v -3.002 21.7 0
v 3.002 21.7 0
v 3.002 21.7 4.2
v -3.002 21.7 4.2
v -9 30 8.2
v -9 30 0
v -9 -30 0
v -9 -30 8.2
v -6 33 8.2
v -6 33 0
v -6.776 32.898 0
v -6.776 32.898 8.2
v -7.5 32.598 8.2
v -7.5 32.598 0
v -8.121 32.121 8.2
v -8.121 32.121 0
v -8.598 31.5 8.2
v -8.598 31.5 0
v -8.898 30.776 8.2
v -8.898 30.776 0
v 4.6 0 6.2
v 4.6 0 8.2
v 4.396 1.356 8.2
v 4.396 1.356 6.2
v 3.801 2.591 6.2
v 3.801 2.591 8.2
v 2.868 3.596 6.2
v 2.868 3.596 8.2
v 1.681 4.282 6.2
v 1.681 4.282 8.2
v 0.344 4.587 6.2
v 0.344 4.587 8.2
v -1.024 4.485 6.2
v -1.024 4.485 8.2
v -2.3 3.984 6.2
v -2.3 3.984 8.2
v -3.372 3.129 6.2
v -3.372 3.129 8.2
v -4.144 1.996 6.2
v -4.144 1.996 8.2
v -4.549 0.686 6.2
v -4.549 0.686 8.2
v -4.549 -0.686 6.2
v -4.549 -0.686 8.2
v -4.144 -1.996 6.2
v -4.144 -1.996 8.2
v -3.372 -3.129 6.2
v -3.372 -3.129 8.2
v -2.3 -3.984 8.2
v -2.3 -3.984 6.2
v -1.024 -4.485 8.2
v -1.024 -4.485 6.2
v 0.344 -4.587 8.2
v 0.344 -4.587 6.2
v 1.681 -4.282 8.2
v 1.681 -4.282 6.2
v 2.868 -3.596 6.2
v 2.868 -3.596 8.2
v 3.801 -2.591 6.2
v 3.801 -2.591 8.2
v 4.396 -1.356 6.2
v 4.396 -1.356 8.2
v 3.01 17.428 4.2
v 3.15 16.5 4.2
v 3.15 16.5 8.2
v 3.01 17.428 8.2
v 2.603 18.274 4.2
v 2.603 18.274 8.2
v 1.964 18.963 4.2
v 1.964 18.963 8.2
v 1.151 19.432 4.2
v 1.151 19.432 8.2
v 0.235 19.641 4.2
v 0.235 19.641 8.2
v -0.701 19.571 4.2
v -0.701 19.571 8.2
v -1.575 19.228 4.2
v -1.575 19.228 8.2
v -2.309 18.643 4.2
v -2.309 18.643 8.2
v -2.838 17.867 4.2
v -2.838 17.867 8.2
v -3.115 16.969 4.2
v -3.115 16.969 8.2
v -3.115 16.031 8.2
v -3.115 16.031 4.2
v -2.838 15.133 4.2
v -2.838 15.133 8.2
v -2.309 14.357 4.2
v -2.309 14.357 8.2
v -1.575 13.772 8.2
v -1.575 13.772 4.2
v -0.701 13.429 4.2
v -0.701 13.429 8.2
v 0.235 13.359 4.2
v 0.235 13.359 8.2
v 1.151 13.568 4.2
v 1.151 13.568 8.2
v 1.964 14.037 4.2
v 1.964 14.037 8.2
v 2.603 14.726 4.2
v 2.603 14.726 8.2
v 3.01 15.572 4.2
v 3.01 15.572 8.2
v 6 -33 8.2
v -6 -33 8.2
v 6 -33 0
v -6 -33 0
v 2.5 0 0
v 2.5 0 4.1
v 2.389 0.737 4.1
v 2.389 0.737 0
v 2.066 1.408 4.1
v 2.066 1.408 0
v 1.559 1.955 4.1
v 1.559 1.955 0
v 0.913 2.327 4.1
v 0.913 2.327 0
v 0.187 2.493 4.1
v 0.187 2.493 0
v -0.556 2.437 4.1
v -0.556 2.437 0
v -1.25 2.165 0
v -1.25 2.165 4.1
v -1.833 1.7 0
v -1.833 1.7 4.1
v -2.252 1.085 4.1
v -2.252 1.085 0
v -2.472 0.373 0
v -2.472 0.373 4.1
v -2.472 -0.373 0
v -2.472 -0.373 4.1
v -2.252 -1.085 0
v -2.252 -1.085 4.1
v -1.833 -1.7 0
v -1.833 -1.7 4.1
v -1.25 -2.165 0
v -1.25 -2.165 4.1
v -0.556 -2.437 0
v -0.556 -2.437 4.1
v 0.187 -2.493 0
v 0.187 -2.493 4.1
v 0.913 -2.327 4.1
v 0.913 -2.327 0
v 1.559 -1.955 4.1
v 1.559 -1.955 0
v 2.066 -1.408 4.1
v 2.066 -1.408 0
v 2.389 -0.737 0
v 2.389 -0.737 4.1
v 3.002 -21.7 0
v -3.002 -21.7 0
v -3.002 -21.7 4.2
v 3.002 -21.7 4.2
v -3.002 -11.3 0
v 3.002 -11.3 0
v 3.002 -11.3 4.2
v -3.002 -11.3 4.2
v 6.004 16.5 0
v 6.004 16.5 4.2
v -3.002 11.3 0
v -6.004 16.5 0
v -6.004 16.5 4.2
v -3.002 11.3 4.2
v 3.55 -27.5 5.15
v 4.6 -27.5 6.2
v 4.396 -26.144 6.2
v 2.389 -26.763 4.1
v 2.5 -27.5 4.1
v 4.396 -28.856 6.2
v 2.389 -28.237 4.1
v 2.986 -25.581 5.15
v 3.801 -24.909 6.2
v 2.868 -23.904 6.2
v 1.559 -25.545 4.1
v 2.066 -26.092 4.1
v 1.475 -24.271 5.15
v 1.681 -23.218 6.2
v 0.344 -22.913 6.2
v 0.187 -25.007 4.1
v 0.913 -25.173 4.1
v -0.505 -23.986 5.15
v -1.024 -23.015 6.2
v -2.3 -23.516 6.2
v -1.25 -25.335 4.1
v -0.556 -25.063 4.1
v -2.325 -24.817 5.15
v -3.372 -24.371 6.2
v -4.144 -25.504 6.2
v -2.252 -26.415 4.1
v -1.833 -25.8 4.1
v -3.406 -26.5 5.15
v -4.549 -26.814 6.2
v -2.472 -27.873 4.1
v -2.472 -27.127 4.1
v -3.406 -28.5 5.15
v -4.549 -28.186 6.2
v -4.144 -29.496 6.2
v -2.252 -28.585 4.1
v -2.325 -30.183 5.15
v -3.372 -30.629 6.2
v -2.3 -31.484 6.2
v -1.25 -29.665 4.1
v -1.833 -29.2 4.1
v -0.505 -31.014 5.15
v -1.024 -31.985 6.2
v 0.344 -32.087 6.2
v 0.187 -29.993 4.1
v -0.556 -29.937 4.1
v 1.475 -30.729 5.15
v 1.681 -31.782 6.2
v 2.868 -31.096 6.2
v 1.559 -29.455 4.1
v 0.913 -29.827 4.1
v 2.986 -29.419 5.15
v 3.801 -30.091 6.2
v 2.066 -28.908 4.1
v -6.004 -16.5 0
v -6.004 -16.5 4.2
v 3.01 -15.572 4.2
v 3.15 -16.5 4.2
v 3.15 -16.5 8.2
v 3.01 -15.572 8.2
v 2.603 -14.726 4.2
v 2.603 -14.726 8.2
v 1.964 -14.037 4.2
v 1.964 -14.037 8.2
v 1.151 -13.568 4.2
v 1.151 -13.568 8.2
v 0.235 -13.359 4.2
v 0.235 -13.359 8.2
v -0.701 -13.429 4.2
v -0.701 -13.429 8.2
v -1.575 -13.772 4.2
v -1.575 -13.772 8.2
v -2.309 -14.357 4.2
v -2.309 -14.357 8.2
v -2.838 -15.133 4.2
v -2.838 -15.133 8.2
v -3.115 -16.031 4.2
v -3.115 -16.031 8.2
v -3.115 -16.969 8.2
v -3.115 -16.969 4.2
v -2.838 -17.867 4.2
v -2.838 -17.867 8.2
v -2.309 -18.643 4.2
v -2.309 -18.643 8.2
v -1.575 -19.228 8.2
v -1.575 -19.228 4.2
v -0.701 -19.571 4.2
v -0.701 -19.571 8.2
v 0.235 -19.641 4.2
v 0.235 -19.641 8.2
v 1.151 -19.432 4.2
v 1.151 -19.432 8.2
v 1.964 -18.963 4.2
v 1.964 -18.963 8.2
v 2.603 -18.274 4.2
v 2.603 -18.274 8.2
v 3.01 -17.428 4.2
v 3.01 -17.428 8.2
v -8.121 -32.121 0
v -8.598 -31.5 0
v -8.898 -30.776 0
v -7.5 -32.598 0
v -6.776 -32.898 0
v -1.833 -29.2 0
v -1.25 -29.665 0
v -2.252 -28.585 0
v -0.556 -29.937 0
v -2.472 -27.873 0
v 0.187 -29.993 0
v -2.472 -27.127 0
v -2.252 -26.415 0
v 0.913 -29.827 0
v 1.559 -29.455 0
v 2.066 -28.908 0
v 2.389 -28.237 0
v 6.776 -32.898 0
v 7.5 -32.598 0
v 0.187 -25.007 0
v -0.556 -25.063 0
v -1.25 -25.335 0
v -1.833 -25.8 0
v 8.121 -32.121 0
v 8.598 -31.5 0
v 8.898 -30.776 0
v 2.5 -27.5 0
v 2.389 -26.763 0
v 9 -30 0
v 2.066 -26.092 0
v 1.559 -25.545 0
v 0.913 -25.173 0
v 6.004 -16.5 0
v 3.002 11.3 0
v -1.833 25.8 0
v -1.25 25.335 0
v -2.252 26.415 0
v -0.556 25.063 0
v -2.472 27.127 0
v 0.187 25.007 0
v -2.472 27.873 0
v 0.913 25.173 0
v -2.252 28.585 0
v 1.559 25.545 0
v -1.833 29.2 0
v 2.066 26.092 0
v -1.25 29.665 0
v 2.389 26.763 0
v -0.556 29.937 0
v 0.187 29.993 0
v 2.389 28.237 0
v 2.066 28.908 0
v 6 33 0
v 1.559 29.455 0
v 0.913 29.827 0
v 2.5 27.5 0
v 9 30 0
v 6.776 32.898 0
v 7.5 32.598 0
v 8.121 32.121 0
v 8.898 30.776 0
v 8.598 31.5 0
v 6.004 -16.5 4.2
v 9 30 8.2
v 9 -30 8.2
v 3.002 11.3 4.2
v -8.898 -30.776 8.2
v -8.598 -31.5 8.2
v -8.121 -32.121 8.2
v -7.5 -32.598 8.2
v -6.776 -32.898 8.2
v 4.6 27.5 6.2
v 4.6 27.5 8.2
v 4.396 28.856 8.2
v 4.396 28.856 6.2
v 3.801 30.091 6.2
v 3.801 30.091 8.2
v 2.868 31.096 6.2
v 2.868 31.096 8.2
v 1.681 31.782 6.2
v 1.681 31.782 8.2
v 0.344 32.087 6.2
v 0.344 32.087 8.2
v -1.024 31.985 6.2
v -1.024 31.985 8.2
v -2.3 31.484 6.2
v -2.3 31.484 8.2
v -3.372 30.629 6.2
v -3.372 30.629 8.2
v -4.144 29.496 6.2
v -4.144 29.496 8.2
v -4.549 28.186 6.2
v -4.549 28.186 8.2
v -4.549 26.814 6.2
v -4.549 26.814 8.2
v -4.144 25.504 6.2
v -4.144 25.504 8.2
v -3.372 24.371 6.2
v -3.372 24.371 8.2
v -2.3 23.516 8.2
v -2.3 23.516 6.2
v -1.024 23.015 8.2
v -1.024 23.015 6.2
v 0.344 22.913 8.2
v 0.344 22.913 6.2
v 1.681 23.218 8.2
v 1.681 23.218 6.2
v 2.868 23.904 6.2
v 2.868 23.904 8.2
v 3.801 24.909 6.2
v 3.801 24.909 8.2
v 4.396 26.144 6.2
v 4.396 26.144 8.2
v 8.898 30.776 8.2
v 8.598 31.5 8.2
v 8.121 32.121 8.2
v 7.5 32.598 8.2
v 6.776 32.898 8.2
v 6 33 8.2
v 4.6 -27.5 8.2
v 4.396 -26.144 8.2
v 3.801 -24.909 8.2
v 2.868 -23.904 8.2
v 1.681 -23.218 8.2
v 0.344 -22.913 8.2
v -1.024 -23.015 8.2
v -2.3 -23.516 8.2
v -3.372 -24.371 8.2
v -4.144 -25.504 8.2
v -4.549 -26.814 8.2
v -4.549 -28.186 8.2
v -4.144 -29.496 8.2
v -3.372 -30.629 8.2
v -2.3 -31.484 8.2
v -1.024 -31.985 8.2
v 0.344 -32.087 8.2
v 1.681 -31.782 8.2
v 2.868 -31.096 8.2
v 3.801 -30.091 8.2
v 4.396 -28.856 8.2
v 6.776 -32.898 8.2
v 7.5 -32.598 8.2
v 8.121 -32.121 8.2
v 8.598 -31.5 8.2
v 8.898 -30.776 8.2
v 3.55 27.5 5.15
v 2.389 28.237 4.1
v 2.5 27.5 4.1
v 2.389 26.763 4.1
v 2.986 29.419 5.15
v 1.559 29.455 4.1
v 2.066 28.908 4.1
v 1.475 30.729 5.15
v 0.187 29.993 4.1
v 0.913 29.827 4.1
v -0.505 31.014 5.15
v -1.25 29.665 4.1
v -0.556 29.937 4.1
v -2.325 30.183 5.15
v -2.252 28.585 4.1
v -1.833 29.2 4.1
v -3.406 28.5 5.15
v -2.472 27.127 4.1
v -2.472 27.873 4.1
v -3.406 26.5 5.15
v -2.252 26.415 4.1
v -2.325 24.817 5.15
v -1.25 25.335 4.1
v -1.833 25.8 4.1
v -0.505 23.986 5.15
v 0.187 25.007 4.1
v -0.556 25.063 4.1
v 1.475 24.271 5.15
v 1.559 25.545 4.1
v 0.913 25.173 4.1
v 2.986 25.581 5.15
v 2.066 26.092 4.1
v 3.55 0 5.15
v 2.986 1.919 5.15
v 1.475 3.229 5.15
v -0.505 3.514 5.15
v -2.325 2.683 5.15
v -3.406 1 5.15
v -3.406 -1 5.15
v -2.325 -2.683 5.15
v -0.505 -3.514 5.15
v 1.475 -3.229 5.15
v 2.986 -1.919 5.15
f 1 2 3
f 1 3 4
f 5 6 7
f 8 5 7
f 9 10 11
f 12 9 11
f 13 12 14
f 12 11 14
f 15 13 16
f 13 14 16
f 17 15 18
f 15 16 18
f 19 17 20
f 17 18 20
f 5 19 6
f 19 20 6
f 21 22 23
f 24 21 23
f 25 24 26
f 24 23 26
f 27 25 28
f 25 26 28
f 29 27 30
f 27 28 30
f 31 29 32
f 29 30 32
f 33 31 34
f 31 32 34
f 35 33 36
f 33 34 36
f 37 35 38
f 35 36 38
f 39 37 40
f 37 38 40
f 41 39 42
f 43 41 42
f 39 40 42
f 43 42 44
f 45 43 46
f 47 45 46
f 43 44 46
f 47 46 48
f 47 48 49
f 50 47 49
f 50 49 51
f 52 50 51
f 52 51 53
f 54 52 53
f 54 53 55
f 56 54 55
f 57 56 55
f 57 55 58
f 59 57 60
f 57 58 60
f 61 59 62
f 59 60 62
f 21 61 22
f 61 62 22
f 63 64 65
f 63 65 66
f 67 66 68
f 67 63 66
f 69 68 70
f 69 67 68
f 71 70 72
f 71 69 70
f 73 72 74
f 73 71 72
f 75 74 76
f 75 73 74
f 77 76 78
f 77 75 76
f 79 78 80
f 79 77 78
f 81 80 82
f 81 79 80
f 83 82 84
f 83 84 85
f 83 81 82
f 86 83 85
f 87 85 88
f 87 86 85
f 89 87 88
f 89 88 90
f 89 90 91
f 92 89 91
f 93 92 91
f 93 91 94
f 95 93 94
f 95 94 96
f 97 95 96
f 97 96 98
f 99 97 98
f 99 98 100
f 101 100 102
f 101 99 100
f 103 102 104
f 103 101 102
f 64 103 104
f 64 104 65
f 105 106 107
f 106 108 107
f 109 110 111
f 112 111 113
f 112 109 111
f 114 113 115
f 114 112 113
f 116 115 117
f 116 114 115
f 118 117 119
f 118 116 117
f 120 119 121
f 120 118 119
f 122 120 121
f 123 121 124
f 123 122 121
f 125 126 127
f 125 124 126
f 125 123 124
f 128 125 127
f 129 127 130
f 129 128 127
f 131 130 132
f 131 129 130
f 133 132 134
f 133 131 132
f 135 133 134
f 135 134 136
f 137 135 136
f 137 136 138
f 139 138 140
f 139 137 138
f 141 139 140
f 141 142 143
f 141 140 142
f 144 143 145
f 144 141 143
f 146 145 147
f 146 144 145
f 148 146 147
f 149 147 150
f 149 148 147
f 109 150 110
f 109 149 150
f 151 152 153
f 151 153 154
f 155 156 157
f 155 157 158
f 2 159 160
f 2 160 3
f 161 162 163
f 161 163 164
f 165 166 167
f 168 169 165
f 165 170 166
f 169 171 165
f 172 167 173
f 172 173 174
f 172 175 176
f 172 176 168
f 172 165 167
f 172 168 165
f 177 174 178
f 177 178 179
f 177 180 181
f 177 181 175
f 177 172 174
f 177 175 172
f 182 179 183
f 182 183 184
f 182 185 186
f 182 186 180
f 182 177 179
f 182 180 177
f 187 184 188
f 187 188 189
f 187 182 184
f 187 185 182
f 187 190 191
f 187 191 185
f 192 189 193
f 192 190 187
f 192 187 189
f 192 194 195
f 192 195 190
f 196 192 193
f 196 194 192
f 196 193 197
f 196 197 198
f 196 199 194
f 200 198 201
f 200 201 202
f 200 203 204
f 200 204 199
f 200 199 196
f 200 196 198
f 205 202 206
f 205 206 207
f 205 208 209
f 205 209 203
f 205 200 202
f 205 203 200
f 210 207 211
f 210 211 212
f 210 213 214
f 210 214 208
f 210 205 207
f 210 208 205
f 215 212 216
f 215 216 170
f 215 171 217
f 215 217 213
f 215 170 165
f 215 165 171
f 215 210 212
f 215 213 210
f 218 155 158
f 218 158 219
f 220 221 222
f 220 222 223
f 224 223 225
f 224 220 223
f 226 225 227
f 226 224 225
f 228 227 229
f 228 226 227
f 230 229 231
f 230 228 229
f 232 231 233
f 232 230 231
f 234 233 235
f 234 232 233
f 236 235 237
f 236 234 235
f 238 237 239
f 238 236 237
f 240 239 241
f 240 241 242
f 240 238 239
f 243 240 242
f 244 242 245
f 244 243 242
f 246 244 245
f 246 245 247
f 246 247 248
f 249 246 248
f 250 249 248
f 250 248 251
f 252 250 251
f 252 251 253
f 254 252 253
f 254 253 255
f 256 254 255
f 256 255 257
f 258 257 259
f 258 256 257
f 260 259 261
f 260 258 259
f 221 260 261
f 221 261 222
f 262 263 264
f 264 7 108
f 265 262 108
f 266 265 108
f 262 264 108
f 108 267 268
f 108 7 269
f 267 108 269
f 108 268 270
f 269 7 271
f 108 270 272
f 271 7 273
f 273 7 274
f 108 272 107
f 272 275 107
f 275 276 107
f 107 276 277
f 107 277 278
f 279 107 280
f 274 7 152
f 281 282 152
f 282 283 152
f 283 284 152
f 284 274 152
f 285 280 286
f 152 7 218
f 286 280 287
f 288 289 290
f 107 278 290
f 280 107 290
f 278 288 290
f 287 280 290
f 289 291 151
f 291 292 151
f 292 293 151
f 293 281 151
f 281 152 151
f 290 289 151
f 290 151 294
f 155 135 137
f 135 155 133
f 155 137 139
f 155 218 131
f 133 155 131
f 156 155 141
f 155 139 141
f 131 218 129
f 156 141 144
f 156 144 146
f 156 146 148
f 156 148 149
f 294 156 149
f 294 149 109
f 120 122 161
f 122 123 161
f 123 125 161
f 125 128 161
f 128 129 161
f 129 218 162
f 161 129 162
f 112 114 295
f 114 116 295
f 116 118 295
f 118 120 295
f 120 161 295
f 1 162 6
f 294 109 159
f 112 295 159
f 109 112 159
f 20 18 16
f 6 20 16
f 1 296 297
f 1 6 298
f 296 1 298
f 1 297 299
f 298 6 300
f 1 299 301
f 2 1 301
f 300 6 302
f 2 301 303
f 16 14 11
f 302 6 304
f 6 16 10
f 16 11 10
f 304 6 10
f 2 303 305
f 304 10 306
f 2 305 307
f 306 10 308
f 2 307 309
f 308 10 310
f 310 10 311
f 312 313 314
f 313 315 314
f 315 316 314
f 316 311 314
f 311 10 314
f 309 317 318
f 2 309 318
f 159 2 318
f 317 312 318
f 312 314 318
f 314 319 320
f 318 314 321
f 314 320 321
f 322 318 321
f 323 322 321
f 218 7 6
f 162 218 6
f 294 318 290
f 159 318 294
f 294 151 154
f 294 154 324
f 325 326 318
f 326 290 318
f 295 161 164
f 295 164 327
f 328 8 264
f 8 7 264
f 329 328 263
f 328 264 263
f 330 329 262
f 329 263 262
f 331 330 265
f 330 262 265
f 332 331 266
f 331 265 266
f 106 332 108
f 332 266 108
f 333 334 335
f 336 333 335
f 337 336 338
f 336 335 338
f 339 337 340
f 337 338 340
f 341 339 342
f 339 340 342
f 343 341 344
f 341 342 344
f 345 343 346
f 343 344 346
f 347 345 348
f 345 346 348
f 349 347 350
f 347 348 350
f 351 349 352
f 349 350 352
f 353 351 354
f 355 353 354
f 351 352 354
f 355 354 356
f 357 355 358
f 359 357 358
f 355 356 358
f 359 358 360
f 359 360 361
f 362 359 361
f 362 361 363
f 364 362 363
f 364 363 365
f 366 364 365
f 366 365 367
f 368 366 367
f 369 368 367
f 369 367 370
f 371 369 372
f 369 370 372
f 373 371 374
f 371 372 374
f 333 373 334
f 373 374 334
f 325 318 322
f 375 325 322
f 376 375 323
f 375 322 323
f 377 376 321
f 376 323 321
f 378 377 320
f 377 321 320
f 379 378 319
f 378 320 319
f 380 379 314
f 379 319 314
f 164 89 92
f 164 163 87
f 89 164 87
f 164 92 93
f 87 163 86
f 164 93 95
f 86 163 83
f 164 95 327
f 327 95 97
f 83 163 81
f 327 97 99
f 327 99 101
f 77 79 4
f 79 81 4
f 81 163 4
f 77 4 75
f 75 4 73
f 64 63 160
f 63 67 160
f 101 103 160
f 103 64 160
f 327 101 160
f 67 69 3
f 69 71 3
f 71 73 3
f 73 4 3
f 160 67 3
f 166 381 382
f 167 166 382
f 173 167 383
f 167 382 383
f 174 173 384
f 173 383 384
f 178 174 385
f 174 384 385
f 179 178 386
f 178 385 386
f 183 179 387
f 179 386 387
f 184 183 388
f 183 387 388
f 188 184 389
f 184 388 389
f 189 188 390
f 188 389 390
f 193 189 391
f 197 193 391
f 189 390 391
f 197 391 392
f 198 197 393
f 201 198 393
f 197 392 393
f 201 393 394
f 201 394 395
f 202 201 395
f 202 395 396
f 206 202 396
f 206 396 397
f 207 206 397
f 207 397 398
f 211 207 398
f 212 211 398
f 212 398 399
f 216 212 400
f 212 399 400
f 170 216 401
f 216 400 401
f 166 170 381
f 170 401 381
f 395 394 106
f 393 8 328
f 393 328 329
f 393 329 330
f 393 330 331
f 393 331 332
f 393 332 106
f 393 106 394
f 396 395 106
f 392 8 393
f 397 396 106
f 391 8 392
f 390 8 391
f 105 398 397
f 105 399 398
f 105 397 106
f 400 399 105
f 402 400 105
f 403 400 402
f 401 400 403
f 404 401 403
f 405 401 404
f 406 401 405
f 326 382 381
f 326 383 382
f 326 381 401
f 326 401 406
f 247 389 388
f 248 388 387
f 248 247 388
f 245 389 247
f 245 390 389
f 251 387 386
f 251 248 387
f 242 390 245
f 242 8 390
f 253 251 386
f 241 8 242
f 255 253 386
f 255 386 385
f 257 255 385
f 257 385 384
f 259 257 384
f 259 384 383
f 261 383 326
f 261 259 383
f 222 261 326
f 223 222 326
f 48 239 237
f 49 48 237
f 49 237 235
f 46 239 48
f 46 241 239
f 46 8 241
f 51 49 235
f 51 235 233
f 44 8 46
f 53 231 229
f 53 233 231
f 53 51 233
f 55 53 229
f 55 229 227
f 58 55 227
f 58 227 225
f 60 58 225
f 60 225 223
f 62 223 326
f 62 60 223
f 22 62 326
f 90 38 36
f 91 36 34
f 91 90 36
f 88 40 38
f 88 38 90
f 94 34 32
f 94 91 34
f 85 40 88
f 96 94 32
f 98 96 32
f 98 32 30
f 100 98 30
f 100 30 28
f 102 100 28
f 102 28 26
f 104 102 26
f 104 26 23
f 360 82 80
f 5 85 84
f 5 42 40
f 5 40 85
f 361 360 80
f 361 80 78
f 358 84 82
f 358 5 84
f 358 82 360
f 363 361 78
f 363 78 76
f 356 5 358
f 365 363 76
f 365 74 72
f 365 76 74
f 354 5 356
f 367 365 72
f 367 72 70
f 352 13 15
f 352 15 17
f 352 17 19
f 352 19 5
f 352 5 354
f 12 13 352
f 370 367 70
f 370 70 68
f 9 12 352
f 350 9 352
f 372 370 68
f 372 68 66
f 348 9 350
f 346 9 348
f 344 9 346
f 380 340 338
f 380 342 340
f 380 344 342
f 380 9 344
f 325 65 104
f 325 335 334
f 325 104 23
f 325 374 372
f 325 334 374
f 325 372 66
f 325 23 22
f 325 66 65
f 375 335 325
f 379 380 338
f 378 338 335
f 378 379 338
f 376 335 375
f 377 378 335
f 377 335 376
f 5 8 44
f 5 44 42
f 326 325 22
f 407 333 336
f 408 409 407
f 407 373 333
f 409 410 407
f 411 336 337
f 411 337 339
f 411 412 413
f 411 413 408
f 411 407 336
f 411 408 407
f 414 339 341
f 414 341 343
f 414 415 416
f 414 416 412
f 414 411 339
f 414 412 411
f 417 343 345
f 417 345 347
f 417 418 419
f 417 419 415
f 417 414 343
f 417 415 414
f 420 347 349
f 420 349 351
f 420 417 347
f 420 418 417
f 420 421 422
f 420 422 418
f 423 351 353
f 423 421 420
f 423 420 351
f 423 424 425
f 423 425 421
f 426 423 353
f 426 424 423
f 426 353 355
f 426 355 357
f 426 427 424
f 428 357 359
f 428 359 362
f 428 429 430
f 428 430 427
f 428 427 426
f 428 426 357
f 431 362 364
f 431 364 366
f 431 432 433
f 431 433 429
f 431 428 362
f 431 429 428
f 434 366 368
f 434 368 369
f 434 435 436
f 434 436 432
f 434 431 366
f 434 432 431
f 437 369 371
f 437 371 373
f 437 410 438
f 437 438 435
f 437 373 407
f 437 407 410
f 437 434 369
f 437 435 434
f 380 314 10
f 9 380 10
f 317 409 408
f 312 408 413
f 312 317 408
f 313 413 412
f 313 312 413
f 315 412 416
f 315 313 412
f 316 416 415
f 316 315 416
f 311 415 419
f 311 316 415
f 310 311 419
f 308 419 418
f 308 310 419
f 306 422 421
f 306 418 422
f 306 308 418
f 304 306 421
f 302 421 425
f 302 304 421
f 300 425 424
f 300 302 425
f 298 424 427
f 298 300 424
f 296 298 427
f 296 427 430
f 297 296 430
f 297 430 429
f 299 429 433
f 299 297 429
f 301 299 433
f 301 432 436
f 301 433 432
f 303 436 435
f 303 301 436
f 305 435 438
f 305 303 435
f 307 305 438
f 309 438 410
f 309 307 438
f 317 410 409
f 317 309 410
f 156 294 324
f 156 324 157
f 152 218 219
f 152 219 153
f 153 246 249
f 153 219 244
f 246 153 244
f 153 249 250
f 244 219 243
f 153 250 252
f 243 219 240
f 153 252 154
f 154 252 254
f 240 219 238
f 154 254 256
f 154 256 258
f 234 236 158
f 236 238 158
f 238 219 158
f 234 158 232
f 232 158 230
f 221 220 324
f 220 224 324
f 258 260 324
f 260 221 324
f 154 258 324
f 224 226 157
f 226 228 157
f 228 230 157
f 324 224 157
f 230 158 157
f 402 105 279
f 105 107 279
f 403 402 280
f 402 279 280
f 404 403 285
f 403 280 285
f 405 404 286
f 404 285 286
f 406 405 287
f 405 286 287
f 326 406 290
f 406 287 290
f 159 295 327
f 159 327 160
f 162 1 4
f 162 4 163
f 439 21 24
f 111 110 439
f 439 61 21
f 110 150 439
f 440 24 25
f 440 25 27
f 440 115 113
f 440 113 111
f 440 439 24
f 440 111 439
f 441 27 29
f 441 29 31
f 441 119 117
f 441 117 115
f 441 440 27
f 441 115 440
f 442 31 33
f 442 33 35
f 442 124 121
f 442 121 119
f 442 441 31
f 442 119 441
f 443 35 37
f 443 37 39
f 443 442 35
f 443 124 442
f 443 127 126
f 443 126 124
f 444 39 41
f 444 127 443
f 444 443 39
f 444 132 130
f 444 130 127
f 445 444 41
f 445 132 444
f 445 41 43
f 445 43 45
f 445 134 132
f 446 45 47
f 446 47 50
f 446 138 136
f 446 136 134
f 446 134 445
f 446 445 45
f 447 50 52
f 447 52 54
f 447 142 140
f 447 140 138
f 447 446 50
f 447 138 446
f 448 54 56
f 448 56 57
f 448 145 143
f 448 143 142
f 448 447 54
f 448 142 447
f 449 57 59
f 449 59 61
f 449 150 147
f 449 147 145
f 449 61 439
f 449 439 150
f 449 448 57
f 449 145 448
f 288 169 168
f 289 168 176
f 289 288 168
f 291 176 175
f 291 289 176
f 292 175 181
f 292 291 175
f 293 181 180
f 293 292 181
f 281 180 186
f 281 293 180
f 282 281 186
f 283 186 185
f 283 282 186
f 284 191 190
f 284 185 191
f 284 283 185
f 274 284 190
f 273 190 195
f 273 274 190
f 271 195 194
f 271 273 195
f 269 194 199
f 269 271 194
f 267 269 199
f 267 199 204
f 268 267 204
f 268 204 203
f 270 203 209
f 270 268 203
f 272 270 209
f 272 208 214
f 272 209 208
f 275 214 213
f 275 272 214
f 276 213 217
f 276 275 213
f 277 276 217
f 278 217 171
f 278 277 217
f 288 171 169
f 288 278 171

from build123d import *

# Parameters (mm, degrees)
SKETCH009_R   = 2.5
PAD009_DEPTH  = 4.2
SKETCH010_R   = 2.5
SKETCH010_R_2 = 3.15
PAD010_DEPTH  = 4
SKETCH011_R   = 4.6
HOLE_DEPTH    = 2
HOLE_TIPS_R   = 4.6


with BuildPart() as part:
    # Sketch009 → Pad009 (new body)
    with BuildSketch(Plane.XY):
        with BuildLine():
            Line((-9, 30), (-9, -30))
            ThreePointArc((-9, -30), (-8.12132, -32.12132), (-6, -33))
            Line((-6, -33), (6, -33))
            ThreePointArc((6, -33), (8.12132, -32.12132), (9, -30))
            Line((9, -30), (9, 30))
            ThreePointArc((9, 30), (8.12132, 32.12132), (6, 33))
            Line((6, 33), (-6, 33))
            ThreePointArc((-6, 33), (-8.12132, 32.12132), (-9, 30))
        make_face()
        with Locations((0, 27.5)):
            Circle(SKETCH009_R, mode=Mode.SUBTRACT)
        with Locations((0, -27.5)):
            Circle(SKETCH009_R, mode=Mode.SUBTRACT)
        Circle(SKETCH009_R, mode=Mode.SUBTRACT)
        Polygon((3.002221, 11.3), (6.004443, 16.5), (3.002221, 21.7), (-3.002221, 21.7), (-6.004443, 16.5), (-3.002221, 11.3), align=None, mode=Mode.SUBTRACT)
        Polygon((-3.002221, -21.7), (3.002221, -21.7), (6.004443, -16.5), (3.002221, -11.3), (-3.002221, -11.3), (-6.004443, -16.5), align=None, mode=Mode.SUBTRACT)
    extrude(amount=PAD009_DEPTH)

    # Sketch010 (on Face25 of Pad009) → Pad010 (join)
    with BuildSketch(Plane.XY.offset(4.2)):
        with BuildLine():
            Line((-9, 30), (-9, -30))
            ThreePointArc((-9, -30), (-8.12132, -32.12132), (-6, -33))
            Line((-6, -33), (6, -33))
            ThreePointArc((6, -33), (8.12132, -32.12132), (9, -30))
            Line((9, -30), (9, 30))
            ThreePointArc((9, 30), (8.12132, 32.12132), (6, 33))
            Line((6, 33), (-6, 33))
            ThreePointArc((-6, 33), (-8.12132, 32.12132), (-9, 30))
        make_face()
        with Locations((0, 27.5)):
            Circle(SKETCH010_R, mode=Mode.SUBTRACT)
        Circle(SKETCH010_R, mode=Mode.SUBTRACT)
        with Locations((0, -27.5)):
            Circle(SKETCH010_R, mode=Mode.SUBTRACT)
        with Locations((0, 16.5)):
            Circle(SKETCH010_R_2, mode=Mode.SUBTRACT)
        with Locations((0, -16.5)):
            Circle(SKETCH010_R_2, mode=Mode.SUBTRACT)
    extrude(amount=PAD010_DEPTH)

    # Sketch011 (on Face17 of Pad010) → Hole (cut)
    with BuildSketch(Plane.XY.offset(8.2)):
        Circle(SKETCH011_R)
        with Locations((0, -27.5)):
            Circle(SKETCH011_R)
        with Locations((0, 27.5)):
            Circle(SKETCH011_R)
    extrude(amount=-HOLE_DEPTH, mode=Mode.SUBTRACT)

    # Hole tips → Hole tip 1 section 0
    with BuildSketch(Plane.XY.offset(6.2), mode=Mode.PRIVATE) as hole_tip_1_s0:
        Circle(HOLE_TIPS_R)
    loft([hole_tip_1_s0.sketch, Vertex(0, 0, 1.6)], mode=Mode.SUBTRACT)

    # Hole tips → Hole tip 2 section 0
    with BuildSketch(Plane.XY.offset(6.2), mode=Mode.PRIVATE) as hole_tip_2_s0:
        with Locations((0, -27.5)):
            Circle(HOLE_TIPS_R)
    loft([hole_tip_2_s0.sketch, Vertex(0, -27.5, 1.6)], mode=Mode.SUBTRACT)

    # Hole tips → Hole tip 3 section 0
    with BuildSketch(Plane.XY.offset(6.2), mode=Mode.PRIVATE) as hole_tip_3_s0:
        with Locations((0, 27.5)):
            Circle(HOLE_TIPS_R)
    loft([hole_tip_3_s0.sketch, Vertex(0, 27.5, 1.6)], mode=Mode.SUBTRACT)


solid = part.part
